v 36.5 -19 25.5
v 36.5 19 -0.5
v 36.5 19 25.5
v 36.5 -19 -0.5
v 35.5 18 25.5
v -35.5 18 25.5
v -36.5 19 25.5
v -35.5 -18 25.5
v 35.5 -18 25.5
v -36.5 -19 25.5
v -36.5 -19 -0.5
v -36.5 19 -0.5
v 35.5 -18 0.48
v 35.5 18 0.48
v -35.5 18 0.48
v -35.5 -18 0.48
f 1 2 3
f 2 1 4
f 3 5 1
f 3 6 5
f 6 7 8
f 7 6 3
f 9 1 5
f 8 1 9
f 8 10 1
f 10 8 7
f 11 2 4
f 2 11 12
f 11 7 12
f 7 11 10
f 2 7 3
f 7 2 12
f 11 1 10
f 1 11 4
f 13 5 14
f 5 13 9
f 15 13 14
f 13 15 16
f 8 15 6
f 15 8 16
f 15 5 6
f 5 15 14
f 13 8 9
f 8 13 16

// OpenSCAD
//copyright 2015 Richard Swika
//All Rights Reserved
//Rev. Orig - Jan 2, 2015 - 
//Use anytime you need a small hollow box of specific dimensions and wall thickness. 
//Initially designed as pasta box ends to help prevent spills; slip over the end of the existing box.
//Can also make a hollow beam or rectangular tube.
//Rev. A - Jan 6, 2016 - changed slider bars to input boxes for a better user expierence in Customizer
//per user requests - thanks to Philip Brechler for feedback
//Rev B - March 25, 2016 - Updated to work with customizer

/* [Dimensions] */

//Inside length, X axis (mm)?
length = 71;

//Inside width, Y axis (mm)?
width = 36;

//Inside height, Z axis (mm)?
height = 25;

//Thickness of walls (mm)?
wall_thickness = 1;

//Thickness of end (mm)?
end_thickness = 1;


module box_end(){
	translate([0,0,height/2])
	difference(){
		cube([length+2*wall_thickness,width+2*wall_thickness,height+end_thickness],center=true);
		translate([0,0,end_thickness-0.02]) cube([length,width,height+1],center=true);
	}
}

box_end();
